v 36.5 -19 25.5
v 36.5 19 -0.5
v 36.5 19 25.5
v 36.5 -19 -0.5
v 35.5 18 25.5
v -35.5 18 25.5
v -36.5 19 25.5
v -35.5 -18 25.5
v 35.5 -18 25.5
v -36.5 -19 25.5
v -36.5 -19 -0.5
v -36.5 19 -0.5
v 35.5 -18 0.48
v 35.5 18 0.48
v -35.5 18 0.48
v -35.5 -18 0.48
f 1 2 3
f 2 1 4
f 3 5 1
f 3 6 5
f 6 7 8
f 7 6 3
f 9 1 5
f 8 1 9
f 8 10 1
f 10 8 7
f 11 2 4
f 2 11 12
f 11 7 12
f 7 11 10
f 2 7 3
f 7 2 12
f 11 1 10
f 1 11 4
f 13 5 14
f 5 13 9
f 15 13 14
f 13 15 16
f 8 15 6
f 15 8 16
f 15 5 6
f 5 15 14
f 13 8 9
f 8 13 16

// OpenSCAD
//copyright 2015 Richard Swika
//All Rights Reserved
//Rev. Orig - Jan 2, 2015 - 
//Use anytime you need a small hollow box of specific dimensions and wall thickness. 
//Initially designed as pasta box ends to help prevent spills; slip over the end of the existing box.
//Can also make a hollow beam or rectangular tube.
//Rev. A - Jan 6, 2016 - changed slider bars to input boxes for a better user expierence in Customizer
//per user requests - thanks to Philip Brechler for feedback
//Rev B - March 25, 2016 - Updated to work with customizer

/* [Dimensions] */

//Inside length, X axis (mm)?
length = 71;

//Inside width, Y axis (mm)?
width = 36;

//Inside height, Z axis (mm)?
height = 25;

//Thickness of walls (mm)?
wall_thickness = 1;

//Thickness of end (mm)?
end_thickness = 1;


module box_end(){
	translate([0,0,height/2])
	difference(){
		cube([length+2*wall_thickness,width+2*wall_thickness,height+end_thickness],center=true);
		translate([0,0,end_thickness-0.02]) cube([length,width,height+1],center=true);
	}
}

box_end();
